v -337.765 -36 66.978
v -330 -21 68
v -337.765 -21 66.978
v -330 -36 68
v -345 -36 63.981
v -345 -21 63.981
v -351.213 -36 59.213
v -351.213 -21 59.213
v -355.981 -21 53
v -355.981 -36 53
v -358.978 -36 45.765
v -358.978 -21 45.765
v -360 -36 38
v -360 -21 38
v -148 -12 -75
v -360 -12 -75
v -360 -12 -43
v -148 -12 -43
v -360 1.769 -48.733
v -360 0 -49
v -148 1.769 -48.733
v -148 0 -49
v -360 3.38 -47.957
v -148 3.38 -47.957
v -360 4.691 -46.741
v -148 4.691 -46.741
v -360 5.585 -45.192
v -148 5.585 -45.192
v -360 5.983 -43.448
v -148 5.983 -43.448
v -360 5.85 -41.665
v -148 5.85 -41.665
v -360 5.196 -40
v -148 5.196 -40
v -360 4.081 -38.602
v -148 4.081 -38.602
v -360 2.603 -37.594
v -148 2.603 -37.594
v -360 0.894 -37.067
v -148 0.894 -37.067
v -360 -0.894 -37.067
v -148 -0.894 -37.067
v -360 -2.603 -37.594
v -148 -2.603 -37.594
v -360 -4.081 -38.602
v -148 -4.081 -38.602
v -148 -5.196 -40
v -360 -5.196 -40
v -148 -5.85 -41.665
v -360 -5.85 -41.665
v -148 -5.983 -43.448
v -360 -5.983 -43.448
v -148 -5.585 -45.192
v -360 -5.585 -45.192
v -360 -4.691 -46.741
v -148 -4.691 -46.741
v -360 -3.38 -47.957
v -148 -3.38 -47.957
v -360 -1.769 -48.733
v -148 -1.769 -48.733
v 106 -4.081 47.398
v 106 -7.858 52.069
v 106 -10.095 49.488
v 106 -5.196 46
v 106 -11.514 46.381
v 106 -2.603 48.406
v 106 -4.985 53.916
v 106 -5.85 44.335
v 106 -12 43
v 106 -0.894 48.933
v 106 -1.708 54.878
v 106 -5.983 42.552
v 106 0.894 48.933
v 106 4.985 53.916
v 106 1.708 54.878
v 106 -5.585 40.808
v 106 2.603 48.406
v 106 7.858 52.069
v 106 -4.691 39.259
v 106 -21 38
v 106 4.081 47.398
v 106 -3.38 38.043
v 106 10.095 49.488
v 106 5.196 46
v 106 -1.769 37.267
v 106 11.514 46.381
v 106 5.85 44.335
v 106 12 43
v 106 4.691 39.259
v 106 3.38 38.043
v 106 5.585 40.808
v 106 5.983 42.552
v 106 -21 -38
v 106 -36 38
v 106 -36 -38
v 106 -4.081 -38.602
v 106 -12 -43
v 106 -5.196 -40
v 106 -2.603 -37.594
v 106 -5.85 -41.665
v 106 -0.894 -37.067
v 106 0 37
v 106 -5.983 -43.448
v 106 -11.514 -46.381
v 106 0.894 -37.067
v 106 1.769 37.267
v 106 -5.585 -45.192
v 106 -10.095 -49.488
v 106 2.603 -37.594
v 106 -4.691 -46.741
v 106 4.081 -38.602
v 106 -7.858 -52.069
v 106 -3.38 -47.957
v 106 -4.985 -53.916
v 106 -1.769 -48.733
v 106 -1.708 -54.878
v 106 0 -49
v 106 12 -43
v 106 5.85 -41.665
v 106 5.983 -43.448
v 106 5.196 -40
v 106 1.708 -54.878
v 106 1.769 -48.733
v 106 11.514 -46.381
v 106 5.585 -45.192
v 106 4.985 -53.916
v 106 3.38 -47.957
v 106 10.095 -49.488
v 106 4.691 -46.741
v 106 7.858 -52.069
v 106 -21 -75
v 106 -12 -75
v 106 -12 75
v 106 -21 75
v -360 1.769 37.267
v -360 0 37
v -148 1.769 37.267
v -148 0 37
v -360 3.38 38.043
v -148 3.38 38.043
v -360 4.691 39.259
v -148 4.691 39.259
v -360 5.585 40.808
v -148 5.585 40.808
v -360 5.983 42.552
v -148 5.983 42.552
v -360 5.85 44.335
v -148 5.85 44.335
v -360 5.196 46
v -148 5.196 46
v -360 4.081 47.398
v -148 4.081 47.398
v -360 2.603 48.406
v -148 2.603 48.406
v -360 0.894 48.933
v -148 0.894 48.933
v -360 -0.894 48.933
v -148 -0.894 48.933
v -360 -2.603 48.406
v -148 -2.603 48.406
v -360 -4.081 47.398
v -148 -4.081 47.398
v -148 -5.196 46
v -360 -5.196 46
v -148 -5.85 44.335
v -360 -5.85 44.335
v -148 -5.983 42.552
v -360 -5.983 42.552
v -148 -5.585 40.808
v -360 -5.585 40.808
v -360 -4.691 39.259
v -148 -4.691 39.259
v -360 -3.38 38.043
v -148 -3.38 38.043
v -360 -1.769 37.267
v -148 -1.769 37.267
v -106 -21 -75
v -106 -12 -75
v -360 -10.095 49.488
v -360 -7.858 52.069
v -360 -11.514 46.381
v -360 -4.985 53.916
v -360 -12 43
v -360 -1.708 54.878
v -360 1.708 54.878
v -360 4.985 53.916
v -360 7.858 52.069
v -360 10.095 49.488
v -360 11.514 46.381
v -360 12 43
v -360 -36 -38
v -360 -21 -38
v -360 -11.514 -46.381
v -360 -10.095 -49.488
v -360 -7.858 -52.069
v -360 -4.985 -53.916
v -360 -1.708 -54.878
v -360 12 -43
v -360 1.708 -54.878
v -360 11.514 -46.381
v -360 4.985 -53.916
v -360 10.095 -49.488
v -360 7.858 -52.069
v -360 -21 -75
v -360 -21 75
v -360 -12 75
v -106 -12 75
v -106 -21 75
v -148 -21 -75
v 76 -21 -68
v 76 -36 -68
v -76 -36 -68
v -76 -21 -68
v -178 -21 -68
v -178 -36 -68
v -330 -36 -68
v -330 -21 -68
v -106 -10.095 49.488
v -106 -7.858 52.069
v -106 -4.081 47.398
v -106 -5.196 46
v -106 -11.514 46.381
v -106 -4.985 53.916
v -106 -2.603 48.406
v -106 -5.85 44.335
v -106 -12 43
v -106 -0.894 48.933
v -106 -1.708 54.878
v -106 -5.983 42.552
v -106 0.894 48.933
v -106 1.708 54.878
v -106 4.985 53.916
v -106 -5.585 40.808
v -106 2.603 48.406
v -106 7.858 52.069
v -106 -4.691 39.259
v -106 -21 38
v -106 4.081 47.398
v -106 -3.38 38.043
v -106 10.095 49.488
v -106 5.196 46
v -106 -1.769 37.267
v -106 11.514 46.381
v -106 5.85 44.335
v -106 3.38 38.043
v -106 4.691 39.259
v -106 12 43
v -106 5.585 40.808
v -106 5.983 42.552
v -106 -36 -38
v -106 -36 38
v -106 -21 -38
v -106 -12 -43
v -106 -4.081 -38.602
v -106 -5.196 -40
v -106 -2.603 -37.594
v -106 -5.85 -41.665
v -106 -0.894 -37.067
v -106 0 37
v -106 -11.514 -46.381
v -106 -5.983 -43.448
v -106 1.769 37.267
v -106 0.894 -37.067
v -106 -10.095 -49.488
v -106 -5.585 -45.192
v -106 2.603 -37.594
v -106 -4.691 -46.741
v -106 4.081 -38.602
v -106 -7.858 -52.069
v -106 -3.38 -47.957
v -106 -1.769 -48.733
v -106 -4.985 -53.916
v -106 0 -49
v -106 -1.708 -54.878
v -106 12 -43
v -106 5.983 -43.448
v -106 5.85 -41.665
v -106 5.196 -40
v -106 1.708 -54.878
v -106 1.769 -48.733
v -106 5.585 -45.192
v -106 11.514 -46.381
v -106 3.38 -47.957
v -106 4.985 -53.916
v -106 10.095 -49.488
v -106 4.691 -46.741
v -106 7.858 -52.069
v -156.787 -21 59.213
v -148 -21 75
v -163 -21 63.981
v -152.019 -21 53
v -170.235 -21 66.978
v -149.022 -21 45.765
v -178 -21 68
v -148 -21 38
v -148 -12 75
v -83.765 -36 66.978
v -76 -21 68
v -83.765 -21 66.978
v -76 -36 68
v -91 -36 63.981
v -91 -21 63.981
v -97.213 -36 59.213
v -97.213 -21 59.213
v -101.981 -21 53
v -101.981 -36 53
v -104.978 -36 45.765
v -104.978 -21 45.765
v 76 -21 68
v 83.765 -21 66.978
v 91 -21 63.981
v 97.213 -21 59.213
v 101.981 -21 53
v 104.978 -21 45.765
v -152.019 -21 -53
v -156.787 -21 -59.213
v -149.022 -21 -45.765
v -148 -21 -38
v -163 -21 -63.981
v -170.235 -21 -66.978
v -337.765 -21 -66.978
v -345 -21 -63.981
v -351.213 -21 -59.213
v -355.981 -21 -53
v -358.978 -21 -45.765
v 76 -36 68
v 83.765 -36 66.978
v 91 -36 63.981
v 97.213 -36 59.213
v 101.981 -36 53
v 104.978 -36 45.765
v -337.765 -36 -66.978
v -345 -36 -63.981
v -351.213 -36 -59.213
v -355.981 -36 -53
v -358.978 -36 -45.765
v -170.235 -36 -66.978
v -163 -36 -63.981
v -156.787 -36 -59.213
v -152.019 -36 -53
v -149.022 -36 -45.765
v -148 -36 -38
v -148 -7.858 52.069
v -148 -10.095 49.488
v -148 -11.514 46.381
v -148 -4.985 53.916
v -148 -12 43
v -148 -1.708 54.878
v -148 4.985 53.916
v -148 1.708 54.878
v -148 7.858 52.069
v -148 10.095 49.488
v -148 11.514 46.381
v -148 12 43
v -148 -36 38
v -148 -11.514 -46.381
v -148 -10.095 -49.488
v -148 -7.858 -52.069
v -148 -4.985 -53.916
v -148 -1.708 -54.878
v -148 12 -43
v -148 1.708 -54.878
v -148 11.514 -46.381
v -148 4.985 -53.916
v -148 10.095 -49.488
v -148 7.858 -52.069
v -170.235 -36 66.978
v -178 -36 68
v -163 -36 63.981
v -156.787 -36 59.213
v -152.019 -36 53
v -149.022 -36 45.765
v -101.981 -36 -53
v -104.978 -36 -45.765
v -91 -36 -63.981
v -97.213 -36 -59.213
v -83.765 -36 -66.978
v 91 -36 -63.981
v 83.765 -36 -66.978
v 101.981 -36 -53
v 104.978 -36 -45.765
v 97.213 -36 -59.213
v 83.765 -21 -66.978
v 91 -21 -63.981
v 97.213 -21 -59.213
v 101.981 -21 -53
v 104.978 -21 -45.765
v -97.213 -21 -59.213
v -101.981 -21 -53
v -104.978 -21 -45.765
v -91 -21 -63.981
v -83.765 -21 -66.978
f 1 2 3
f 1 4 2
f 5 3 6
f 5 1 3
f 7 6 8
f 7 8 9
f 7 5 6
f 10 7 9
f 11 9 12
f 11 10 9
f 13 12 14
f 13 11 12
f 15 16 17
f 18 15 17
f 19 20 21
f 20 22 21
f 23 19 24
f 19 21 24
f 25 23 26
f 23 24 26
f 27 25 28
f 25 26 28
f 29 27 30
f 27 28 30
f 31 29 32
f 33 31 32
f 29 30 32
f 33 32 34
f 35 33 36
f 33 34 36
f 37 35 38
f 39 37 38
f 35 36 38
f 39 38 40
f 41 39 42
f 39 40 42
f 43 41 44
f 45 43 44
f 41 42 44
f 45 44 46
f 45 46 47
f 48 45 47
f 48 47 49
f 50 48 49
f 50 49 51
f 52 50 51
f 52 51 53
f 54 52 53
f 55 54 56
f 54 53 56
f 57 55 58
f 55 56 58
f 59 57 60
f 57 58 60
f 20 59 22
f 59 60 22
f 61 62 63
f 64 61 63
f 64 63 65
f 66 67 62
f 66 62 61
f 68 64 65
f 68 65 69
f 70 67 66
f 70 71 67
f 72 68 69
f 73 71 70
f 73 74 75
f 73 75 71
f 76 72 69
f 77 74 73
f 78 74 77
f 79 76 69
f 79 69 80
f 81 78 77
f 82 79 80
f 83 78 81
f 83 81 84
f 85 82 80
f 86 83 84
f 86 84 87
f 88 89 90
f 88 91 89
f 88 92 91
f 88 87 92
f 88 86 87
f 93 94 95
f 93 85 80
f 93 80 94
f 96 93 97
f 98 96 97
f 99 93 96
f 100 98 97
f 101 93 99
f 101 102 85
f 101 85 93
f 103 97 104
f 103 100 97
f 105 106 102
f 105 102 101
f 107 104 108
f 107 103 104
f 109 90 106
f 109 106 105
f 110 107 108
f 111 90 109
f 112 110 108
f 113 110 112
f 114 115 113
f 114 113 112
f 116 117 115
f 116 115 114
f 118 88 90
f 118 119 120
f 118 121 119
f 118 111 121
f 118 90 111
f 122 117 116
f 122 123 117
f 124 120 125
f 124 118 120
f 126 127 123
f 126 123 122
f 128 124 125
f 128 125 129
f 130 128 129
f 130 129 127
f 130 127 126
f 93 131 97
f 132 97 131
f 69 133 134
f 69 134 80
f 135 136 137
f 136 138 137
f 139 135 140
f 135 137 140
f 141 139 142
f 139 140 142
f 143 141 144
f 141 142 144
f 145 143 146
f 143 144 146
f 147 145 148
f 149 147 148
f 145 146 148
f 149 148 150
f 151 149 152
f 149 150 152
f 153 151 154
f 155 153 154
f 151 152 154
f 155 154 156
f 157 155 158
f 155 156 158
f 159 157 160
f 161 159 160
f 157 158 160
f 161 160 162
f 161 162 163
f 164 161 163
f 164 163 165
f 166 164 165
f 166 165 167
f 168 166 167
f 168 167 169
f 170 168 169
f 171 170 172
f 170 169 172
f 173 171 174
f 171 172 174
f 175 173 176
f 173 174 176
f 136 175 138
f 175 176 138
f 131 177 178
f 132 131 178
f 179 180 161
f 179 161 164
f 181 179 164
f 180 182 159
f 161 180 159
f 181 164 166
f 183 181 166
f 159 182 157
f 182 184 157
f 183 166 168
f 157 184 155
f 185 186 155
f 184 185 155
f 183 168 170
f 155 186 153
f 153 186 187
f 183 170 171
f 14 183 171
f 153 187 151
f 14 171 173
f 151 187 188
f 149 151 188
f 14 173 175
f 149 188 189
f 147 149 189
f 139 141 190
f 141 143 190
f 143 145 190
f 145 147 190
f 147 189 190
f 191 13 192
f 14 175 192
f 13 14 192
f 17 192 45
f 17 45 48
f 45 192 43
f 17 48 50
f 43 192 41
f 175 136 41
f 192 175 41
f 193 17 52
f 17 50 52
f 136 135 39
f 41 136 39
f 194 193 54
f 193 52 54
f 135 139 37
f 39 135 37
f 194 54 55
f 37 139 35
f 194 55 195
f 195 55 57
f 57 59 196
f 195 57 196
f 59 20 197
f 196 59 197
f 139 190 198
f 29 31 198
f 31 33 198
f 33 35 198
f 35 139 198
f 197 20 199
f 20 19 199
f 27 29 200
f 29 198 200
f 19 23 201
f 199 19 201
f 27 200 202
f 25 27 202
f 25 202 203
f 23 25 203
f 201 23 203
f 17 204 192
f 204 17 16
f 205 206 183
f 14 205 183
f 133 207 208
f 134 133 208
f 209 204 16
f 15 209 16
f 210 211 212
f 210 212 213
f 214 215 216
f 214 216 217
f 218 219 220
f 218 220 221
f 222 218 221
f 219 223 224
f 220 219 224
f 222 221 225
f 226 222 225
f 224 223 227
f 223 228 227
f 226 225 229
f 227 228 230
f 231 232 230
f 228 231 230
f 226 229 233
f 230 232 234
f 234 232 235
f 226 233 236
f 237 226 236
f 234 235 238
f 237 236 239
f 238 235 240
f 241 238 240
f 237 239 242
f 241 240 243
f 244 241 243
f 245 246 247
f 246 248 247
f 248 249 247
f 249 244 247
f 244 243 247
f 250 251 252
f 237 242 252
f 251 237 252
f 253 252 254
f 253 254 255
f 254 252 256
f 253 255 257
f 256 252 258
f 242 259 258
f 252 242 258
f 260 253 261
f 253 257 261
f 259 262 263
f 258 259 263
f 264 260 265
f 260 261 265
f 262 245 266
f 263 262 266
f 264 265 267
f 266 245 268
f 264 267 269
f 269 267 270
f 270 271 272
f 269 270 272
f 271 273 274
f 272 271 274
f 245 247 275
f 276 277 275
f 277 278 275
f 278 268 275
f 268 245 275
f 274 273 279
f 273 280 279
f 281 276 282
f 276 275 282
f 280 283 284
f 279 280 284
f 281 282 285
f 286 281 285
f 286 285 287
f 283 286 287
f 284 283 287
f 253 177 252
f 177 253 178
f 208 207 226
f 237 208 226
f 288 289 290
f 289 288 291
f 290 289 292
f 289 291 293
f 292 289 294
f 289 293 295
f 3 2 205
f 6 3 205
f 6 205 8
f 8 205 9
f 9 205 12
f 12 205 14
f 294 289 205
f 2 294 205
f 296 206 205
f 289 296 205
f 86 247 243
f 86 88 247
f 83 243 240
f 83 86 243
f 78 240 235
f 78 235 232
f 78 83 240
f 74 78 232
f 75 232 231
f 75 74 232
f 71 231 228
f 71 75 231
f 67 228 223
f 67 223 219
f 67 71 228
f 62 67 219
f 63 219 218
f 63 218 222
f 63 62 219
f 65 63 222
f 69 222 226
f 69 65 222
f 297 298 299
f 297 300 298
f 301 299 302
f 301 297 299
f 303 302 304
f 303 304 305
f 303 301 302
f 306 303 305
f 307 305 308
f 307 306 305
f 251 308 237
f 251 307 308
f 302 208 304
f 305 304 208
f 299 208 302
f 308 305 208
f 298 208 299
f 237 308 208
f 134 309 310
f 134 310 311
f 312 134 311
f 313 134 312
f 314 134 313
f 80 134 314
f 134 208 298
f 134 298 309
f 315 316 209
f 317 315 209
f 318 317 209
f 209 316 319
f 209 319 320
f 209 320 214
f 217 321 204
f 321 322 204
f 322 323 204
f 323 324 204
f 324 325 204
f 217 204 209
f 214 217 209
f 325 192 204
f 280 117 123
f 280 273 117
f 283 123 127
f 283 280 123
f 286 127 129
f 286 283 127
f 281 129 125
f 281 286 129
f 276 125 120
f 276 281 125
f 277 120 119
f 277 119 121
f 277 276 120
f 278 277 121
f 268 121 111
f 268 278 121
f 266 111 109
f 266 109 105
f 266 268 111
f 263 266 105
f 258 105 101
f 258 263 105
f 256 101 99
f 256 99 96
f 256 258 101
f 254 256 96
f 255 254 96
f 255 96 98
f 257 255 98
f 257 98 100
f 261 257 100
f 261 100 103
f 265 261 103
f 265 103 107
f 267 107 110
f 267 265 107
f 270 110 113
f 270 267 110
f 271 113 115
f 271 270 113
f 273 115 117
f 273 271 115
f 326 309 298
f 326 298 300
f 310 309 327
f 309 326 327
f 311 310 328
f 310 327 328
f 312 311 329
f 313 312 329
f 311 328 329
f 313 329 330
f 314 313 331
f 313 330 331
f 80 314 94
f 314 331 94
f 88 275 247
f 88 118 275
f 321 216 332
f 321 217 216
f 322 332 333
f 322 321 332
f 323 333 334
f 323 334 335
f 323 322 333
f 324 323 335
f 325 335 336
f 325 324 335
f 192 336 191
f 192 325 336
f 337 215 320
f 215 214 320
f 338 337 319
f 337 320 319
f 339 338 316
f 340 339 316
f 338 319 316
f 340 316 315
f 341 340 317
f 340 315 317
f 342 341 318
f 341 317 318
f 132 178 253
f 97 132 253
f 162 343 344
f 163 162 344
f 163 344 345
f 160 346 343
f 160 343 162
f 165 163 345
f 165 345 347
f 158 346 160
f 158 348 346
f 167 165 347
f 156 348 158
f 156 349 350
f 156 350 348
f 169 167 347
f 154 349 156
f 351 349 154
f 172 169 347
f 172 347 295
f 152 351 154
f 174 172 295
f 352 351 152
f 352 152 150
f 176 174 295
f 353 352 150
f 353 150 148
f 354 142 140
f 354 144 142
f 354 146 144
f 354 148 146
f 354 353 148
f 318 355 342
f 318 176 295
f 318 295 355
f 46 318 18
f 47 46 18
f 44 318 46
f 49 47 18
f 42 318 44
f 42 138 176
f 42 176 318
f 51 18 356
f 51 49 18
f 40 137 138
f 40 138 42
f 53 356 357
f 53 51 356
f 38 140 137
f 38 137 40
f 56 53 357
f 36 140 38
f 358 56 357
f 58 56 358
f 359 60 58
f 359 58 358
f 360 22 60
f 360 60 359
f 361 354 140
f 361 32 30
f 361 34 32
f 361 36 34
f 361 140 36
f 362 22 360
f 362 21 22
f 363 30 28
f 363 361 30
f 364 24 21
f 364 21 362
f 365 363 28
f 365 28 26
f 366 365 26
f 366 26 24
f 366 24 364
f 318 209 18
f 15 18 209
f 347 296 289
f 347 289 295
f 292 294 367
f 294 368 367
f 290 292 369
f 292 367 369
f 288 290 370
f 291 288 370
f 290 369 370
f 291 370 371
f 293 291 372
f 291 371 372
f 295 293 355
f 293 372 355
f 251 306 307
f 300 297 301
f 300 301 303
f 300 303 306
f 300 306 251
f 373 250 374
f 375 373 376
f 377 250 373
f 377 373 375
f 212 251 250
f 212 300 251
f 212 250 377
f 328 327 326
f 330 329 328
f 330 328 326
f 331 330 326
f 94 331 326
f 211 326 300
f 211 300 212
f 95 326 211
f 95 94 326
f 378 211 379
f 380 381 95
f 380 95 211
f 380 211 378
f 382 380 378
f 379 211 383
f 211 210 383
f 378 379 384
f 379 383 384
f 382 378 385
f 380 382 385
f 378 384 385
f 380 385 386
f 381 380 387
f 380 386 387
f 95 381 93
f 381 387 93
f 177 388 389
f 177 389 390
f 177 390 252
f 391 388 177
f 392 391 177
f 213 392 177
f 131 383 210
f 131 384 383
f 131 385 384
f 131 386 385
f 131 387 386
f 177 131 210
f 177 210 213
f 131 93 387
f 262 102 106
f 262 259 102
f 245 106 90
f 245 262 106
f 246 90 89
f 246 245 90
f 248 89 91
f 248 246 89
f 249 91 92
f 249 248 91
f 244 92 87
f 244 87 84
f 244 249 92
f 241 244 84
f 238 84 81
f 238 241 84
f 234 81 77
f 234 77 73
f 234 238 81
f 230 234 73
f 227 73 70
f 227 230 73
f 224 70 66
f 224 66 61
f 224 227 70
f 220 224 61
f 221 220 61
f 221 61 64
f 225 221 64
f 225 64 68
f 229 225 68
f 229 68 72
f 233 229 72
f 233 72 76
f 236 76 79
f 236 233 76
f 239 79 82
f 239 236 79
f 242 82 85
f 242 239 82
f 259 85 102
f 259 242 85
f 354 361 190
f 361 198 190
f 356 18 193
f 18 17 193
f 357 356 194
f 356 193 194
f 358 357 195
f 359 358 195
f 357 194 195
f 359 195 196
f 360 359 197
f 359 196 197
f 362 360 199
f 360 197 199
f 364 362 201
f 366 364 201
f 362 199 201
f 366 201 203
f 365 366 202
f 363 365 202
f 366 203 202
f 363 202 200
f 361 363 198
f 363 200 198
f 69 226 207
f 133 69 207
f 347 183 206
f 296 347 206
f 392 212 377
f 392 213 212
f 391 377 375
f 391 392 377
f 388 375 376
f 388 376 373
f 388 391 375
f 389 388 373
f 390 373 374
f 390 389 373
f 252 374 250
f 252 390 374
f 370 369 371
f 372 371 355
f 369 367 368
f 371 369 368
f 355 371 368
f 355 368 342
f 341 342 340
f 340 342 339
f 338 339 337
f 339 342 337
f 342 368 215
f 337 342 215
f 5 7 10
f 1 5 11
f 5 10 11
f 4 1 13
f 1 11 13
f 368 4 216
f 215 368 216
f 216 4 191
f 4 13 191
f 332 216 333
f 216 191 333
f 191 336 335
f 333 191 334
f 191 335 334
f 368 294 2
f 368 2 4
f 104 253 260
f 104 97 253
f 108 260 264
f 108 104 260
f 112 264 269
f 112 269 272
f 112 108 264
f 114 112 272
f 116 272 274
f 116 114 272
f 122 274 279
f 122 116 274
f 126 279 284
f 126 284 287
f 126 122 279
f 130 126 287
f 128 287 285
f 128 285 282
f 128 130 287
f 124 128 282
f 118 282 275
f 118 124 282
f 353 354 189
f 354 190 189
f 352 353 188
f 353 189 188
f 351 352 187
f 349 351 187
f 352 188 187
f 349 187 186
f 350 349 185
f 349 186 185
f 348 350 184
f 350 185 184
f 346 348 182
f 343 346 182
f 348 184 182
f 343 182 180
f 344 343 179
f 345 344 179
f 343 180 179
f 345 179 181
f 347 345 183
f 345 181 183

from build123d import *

# Parameters (mm, degrees)
IZIM1_R                     = 6
Y_KSEKLIK_EKSTR_ZYON1_DEPTH = 106
RADYUS1_R                   = 30


with BuildPart() as part:
    # Çizim1 → Yükseklik-Ekstrüzyon1 (new body, symmetric)
    with BuildSketch(Plane(origin=(0, 0, 0), x_dir=(0, 0, -1), z_dir=(1, 0, 0))):
        with BuildLine():
            Line((-43, -12), (43, -12))
            ThreePointArc((43, -12), (55, 0), (43, 12))
            Line((43, 12), (-43, 12))
            ThreePointArc((-43, 12), (-55, 0), (-43, -12))
        make_face()
        with Locations((43, 0)):
            Circle(IZIM1_R, mode=Mode.SUBTRACT)
        with Locations((-43, 0)):
            Circle(IZIM1_R, mode=Mode.SUBTRACT)
        Polygon((-75, -21), (-68, -21), (-68, -36), (68, -36), (68, -21), (75, -21), (75, -12), (43, -12), (-43, -12), (-75, -12), align=None)
    extrude(amount=Y_KSEKLIK_EKSTR_ZYON1_DEPTH, both=True)

    # Radyus1
    radyus1_edges = [part.edges().sort_by_distance(p)[0] for p in [
        (-106, -28.5, -68),
        (-106, -28.5, 68),
        (106, -28.5, 68),
        (106, -28.5, -68),
    ]]
    fillet(radyus1_edges, radius=RADYUS1_R)


with BuildPart() as body_2:
    # Aynalama16: mirrored copy
    add(part.part.mirror(Plane.ZY.offset(127)))


solid = Compound([part.part, body_2.part])
